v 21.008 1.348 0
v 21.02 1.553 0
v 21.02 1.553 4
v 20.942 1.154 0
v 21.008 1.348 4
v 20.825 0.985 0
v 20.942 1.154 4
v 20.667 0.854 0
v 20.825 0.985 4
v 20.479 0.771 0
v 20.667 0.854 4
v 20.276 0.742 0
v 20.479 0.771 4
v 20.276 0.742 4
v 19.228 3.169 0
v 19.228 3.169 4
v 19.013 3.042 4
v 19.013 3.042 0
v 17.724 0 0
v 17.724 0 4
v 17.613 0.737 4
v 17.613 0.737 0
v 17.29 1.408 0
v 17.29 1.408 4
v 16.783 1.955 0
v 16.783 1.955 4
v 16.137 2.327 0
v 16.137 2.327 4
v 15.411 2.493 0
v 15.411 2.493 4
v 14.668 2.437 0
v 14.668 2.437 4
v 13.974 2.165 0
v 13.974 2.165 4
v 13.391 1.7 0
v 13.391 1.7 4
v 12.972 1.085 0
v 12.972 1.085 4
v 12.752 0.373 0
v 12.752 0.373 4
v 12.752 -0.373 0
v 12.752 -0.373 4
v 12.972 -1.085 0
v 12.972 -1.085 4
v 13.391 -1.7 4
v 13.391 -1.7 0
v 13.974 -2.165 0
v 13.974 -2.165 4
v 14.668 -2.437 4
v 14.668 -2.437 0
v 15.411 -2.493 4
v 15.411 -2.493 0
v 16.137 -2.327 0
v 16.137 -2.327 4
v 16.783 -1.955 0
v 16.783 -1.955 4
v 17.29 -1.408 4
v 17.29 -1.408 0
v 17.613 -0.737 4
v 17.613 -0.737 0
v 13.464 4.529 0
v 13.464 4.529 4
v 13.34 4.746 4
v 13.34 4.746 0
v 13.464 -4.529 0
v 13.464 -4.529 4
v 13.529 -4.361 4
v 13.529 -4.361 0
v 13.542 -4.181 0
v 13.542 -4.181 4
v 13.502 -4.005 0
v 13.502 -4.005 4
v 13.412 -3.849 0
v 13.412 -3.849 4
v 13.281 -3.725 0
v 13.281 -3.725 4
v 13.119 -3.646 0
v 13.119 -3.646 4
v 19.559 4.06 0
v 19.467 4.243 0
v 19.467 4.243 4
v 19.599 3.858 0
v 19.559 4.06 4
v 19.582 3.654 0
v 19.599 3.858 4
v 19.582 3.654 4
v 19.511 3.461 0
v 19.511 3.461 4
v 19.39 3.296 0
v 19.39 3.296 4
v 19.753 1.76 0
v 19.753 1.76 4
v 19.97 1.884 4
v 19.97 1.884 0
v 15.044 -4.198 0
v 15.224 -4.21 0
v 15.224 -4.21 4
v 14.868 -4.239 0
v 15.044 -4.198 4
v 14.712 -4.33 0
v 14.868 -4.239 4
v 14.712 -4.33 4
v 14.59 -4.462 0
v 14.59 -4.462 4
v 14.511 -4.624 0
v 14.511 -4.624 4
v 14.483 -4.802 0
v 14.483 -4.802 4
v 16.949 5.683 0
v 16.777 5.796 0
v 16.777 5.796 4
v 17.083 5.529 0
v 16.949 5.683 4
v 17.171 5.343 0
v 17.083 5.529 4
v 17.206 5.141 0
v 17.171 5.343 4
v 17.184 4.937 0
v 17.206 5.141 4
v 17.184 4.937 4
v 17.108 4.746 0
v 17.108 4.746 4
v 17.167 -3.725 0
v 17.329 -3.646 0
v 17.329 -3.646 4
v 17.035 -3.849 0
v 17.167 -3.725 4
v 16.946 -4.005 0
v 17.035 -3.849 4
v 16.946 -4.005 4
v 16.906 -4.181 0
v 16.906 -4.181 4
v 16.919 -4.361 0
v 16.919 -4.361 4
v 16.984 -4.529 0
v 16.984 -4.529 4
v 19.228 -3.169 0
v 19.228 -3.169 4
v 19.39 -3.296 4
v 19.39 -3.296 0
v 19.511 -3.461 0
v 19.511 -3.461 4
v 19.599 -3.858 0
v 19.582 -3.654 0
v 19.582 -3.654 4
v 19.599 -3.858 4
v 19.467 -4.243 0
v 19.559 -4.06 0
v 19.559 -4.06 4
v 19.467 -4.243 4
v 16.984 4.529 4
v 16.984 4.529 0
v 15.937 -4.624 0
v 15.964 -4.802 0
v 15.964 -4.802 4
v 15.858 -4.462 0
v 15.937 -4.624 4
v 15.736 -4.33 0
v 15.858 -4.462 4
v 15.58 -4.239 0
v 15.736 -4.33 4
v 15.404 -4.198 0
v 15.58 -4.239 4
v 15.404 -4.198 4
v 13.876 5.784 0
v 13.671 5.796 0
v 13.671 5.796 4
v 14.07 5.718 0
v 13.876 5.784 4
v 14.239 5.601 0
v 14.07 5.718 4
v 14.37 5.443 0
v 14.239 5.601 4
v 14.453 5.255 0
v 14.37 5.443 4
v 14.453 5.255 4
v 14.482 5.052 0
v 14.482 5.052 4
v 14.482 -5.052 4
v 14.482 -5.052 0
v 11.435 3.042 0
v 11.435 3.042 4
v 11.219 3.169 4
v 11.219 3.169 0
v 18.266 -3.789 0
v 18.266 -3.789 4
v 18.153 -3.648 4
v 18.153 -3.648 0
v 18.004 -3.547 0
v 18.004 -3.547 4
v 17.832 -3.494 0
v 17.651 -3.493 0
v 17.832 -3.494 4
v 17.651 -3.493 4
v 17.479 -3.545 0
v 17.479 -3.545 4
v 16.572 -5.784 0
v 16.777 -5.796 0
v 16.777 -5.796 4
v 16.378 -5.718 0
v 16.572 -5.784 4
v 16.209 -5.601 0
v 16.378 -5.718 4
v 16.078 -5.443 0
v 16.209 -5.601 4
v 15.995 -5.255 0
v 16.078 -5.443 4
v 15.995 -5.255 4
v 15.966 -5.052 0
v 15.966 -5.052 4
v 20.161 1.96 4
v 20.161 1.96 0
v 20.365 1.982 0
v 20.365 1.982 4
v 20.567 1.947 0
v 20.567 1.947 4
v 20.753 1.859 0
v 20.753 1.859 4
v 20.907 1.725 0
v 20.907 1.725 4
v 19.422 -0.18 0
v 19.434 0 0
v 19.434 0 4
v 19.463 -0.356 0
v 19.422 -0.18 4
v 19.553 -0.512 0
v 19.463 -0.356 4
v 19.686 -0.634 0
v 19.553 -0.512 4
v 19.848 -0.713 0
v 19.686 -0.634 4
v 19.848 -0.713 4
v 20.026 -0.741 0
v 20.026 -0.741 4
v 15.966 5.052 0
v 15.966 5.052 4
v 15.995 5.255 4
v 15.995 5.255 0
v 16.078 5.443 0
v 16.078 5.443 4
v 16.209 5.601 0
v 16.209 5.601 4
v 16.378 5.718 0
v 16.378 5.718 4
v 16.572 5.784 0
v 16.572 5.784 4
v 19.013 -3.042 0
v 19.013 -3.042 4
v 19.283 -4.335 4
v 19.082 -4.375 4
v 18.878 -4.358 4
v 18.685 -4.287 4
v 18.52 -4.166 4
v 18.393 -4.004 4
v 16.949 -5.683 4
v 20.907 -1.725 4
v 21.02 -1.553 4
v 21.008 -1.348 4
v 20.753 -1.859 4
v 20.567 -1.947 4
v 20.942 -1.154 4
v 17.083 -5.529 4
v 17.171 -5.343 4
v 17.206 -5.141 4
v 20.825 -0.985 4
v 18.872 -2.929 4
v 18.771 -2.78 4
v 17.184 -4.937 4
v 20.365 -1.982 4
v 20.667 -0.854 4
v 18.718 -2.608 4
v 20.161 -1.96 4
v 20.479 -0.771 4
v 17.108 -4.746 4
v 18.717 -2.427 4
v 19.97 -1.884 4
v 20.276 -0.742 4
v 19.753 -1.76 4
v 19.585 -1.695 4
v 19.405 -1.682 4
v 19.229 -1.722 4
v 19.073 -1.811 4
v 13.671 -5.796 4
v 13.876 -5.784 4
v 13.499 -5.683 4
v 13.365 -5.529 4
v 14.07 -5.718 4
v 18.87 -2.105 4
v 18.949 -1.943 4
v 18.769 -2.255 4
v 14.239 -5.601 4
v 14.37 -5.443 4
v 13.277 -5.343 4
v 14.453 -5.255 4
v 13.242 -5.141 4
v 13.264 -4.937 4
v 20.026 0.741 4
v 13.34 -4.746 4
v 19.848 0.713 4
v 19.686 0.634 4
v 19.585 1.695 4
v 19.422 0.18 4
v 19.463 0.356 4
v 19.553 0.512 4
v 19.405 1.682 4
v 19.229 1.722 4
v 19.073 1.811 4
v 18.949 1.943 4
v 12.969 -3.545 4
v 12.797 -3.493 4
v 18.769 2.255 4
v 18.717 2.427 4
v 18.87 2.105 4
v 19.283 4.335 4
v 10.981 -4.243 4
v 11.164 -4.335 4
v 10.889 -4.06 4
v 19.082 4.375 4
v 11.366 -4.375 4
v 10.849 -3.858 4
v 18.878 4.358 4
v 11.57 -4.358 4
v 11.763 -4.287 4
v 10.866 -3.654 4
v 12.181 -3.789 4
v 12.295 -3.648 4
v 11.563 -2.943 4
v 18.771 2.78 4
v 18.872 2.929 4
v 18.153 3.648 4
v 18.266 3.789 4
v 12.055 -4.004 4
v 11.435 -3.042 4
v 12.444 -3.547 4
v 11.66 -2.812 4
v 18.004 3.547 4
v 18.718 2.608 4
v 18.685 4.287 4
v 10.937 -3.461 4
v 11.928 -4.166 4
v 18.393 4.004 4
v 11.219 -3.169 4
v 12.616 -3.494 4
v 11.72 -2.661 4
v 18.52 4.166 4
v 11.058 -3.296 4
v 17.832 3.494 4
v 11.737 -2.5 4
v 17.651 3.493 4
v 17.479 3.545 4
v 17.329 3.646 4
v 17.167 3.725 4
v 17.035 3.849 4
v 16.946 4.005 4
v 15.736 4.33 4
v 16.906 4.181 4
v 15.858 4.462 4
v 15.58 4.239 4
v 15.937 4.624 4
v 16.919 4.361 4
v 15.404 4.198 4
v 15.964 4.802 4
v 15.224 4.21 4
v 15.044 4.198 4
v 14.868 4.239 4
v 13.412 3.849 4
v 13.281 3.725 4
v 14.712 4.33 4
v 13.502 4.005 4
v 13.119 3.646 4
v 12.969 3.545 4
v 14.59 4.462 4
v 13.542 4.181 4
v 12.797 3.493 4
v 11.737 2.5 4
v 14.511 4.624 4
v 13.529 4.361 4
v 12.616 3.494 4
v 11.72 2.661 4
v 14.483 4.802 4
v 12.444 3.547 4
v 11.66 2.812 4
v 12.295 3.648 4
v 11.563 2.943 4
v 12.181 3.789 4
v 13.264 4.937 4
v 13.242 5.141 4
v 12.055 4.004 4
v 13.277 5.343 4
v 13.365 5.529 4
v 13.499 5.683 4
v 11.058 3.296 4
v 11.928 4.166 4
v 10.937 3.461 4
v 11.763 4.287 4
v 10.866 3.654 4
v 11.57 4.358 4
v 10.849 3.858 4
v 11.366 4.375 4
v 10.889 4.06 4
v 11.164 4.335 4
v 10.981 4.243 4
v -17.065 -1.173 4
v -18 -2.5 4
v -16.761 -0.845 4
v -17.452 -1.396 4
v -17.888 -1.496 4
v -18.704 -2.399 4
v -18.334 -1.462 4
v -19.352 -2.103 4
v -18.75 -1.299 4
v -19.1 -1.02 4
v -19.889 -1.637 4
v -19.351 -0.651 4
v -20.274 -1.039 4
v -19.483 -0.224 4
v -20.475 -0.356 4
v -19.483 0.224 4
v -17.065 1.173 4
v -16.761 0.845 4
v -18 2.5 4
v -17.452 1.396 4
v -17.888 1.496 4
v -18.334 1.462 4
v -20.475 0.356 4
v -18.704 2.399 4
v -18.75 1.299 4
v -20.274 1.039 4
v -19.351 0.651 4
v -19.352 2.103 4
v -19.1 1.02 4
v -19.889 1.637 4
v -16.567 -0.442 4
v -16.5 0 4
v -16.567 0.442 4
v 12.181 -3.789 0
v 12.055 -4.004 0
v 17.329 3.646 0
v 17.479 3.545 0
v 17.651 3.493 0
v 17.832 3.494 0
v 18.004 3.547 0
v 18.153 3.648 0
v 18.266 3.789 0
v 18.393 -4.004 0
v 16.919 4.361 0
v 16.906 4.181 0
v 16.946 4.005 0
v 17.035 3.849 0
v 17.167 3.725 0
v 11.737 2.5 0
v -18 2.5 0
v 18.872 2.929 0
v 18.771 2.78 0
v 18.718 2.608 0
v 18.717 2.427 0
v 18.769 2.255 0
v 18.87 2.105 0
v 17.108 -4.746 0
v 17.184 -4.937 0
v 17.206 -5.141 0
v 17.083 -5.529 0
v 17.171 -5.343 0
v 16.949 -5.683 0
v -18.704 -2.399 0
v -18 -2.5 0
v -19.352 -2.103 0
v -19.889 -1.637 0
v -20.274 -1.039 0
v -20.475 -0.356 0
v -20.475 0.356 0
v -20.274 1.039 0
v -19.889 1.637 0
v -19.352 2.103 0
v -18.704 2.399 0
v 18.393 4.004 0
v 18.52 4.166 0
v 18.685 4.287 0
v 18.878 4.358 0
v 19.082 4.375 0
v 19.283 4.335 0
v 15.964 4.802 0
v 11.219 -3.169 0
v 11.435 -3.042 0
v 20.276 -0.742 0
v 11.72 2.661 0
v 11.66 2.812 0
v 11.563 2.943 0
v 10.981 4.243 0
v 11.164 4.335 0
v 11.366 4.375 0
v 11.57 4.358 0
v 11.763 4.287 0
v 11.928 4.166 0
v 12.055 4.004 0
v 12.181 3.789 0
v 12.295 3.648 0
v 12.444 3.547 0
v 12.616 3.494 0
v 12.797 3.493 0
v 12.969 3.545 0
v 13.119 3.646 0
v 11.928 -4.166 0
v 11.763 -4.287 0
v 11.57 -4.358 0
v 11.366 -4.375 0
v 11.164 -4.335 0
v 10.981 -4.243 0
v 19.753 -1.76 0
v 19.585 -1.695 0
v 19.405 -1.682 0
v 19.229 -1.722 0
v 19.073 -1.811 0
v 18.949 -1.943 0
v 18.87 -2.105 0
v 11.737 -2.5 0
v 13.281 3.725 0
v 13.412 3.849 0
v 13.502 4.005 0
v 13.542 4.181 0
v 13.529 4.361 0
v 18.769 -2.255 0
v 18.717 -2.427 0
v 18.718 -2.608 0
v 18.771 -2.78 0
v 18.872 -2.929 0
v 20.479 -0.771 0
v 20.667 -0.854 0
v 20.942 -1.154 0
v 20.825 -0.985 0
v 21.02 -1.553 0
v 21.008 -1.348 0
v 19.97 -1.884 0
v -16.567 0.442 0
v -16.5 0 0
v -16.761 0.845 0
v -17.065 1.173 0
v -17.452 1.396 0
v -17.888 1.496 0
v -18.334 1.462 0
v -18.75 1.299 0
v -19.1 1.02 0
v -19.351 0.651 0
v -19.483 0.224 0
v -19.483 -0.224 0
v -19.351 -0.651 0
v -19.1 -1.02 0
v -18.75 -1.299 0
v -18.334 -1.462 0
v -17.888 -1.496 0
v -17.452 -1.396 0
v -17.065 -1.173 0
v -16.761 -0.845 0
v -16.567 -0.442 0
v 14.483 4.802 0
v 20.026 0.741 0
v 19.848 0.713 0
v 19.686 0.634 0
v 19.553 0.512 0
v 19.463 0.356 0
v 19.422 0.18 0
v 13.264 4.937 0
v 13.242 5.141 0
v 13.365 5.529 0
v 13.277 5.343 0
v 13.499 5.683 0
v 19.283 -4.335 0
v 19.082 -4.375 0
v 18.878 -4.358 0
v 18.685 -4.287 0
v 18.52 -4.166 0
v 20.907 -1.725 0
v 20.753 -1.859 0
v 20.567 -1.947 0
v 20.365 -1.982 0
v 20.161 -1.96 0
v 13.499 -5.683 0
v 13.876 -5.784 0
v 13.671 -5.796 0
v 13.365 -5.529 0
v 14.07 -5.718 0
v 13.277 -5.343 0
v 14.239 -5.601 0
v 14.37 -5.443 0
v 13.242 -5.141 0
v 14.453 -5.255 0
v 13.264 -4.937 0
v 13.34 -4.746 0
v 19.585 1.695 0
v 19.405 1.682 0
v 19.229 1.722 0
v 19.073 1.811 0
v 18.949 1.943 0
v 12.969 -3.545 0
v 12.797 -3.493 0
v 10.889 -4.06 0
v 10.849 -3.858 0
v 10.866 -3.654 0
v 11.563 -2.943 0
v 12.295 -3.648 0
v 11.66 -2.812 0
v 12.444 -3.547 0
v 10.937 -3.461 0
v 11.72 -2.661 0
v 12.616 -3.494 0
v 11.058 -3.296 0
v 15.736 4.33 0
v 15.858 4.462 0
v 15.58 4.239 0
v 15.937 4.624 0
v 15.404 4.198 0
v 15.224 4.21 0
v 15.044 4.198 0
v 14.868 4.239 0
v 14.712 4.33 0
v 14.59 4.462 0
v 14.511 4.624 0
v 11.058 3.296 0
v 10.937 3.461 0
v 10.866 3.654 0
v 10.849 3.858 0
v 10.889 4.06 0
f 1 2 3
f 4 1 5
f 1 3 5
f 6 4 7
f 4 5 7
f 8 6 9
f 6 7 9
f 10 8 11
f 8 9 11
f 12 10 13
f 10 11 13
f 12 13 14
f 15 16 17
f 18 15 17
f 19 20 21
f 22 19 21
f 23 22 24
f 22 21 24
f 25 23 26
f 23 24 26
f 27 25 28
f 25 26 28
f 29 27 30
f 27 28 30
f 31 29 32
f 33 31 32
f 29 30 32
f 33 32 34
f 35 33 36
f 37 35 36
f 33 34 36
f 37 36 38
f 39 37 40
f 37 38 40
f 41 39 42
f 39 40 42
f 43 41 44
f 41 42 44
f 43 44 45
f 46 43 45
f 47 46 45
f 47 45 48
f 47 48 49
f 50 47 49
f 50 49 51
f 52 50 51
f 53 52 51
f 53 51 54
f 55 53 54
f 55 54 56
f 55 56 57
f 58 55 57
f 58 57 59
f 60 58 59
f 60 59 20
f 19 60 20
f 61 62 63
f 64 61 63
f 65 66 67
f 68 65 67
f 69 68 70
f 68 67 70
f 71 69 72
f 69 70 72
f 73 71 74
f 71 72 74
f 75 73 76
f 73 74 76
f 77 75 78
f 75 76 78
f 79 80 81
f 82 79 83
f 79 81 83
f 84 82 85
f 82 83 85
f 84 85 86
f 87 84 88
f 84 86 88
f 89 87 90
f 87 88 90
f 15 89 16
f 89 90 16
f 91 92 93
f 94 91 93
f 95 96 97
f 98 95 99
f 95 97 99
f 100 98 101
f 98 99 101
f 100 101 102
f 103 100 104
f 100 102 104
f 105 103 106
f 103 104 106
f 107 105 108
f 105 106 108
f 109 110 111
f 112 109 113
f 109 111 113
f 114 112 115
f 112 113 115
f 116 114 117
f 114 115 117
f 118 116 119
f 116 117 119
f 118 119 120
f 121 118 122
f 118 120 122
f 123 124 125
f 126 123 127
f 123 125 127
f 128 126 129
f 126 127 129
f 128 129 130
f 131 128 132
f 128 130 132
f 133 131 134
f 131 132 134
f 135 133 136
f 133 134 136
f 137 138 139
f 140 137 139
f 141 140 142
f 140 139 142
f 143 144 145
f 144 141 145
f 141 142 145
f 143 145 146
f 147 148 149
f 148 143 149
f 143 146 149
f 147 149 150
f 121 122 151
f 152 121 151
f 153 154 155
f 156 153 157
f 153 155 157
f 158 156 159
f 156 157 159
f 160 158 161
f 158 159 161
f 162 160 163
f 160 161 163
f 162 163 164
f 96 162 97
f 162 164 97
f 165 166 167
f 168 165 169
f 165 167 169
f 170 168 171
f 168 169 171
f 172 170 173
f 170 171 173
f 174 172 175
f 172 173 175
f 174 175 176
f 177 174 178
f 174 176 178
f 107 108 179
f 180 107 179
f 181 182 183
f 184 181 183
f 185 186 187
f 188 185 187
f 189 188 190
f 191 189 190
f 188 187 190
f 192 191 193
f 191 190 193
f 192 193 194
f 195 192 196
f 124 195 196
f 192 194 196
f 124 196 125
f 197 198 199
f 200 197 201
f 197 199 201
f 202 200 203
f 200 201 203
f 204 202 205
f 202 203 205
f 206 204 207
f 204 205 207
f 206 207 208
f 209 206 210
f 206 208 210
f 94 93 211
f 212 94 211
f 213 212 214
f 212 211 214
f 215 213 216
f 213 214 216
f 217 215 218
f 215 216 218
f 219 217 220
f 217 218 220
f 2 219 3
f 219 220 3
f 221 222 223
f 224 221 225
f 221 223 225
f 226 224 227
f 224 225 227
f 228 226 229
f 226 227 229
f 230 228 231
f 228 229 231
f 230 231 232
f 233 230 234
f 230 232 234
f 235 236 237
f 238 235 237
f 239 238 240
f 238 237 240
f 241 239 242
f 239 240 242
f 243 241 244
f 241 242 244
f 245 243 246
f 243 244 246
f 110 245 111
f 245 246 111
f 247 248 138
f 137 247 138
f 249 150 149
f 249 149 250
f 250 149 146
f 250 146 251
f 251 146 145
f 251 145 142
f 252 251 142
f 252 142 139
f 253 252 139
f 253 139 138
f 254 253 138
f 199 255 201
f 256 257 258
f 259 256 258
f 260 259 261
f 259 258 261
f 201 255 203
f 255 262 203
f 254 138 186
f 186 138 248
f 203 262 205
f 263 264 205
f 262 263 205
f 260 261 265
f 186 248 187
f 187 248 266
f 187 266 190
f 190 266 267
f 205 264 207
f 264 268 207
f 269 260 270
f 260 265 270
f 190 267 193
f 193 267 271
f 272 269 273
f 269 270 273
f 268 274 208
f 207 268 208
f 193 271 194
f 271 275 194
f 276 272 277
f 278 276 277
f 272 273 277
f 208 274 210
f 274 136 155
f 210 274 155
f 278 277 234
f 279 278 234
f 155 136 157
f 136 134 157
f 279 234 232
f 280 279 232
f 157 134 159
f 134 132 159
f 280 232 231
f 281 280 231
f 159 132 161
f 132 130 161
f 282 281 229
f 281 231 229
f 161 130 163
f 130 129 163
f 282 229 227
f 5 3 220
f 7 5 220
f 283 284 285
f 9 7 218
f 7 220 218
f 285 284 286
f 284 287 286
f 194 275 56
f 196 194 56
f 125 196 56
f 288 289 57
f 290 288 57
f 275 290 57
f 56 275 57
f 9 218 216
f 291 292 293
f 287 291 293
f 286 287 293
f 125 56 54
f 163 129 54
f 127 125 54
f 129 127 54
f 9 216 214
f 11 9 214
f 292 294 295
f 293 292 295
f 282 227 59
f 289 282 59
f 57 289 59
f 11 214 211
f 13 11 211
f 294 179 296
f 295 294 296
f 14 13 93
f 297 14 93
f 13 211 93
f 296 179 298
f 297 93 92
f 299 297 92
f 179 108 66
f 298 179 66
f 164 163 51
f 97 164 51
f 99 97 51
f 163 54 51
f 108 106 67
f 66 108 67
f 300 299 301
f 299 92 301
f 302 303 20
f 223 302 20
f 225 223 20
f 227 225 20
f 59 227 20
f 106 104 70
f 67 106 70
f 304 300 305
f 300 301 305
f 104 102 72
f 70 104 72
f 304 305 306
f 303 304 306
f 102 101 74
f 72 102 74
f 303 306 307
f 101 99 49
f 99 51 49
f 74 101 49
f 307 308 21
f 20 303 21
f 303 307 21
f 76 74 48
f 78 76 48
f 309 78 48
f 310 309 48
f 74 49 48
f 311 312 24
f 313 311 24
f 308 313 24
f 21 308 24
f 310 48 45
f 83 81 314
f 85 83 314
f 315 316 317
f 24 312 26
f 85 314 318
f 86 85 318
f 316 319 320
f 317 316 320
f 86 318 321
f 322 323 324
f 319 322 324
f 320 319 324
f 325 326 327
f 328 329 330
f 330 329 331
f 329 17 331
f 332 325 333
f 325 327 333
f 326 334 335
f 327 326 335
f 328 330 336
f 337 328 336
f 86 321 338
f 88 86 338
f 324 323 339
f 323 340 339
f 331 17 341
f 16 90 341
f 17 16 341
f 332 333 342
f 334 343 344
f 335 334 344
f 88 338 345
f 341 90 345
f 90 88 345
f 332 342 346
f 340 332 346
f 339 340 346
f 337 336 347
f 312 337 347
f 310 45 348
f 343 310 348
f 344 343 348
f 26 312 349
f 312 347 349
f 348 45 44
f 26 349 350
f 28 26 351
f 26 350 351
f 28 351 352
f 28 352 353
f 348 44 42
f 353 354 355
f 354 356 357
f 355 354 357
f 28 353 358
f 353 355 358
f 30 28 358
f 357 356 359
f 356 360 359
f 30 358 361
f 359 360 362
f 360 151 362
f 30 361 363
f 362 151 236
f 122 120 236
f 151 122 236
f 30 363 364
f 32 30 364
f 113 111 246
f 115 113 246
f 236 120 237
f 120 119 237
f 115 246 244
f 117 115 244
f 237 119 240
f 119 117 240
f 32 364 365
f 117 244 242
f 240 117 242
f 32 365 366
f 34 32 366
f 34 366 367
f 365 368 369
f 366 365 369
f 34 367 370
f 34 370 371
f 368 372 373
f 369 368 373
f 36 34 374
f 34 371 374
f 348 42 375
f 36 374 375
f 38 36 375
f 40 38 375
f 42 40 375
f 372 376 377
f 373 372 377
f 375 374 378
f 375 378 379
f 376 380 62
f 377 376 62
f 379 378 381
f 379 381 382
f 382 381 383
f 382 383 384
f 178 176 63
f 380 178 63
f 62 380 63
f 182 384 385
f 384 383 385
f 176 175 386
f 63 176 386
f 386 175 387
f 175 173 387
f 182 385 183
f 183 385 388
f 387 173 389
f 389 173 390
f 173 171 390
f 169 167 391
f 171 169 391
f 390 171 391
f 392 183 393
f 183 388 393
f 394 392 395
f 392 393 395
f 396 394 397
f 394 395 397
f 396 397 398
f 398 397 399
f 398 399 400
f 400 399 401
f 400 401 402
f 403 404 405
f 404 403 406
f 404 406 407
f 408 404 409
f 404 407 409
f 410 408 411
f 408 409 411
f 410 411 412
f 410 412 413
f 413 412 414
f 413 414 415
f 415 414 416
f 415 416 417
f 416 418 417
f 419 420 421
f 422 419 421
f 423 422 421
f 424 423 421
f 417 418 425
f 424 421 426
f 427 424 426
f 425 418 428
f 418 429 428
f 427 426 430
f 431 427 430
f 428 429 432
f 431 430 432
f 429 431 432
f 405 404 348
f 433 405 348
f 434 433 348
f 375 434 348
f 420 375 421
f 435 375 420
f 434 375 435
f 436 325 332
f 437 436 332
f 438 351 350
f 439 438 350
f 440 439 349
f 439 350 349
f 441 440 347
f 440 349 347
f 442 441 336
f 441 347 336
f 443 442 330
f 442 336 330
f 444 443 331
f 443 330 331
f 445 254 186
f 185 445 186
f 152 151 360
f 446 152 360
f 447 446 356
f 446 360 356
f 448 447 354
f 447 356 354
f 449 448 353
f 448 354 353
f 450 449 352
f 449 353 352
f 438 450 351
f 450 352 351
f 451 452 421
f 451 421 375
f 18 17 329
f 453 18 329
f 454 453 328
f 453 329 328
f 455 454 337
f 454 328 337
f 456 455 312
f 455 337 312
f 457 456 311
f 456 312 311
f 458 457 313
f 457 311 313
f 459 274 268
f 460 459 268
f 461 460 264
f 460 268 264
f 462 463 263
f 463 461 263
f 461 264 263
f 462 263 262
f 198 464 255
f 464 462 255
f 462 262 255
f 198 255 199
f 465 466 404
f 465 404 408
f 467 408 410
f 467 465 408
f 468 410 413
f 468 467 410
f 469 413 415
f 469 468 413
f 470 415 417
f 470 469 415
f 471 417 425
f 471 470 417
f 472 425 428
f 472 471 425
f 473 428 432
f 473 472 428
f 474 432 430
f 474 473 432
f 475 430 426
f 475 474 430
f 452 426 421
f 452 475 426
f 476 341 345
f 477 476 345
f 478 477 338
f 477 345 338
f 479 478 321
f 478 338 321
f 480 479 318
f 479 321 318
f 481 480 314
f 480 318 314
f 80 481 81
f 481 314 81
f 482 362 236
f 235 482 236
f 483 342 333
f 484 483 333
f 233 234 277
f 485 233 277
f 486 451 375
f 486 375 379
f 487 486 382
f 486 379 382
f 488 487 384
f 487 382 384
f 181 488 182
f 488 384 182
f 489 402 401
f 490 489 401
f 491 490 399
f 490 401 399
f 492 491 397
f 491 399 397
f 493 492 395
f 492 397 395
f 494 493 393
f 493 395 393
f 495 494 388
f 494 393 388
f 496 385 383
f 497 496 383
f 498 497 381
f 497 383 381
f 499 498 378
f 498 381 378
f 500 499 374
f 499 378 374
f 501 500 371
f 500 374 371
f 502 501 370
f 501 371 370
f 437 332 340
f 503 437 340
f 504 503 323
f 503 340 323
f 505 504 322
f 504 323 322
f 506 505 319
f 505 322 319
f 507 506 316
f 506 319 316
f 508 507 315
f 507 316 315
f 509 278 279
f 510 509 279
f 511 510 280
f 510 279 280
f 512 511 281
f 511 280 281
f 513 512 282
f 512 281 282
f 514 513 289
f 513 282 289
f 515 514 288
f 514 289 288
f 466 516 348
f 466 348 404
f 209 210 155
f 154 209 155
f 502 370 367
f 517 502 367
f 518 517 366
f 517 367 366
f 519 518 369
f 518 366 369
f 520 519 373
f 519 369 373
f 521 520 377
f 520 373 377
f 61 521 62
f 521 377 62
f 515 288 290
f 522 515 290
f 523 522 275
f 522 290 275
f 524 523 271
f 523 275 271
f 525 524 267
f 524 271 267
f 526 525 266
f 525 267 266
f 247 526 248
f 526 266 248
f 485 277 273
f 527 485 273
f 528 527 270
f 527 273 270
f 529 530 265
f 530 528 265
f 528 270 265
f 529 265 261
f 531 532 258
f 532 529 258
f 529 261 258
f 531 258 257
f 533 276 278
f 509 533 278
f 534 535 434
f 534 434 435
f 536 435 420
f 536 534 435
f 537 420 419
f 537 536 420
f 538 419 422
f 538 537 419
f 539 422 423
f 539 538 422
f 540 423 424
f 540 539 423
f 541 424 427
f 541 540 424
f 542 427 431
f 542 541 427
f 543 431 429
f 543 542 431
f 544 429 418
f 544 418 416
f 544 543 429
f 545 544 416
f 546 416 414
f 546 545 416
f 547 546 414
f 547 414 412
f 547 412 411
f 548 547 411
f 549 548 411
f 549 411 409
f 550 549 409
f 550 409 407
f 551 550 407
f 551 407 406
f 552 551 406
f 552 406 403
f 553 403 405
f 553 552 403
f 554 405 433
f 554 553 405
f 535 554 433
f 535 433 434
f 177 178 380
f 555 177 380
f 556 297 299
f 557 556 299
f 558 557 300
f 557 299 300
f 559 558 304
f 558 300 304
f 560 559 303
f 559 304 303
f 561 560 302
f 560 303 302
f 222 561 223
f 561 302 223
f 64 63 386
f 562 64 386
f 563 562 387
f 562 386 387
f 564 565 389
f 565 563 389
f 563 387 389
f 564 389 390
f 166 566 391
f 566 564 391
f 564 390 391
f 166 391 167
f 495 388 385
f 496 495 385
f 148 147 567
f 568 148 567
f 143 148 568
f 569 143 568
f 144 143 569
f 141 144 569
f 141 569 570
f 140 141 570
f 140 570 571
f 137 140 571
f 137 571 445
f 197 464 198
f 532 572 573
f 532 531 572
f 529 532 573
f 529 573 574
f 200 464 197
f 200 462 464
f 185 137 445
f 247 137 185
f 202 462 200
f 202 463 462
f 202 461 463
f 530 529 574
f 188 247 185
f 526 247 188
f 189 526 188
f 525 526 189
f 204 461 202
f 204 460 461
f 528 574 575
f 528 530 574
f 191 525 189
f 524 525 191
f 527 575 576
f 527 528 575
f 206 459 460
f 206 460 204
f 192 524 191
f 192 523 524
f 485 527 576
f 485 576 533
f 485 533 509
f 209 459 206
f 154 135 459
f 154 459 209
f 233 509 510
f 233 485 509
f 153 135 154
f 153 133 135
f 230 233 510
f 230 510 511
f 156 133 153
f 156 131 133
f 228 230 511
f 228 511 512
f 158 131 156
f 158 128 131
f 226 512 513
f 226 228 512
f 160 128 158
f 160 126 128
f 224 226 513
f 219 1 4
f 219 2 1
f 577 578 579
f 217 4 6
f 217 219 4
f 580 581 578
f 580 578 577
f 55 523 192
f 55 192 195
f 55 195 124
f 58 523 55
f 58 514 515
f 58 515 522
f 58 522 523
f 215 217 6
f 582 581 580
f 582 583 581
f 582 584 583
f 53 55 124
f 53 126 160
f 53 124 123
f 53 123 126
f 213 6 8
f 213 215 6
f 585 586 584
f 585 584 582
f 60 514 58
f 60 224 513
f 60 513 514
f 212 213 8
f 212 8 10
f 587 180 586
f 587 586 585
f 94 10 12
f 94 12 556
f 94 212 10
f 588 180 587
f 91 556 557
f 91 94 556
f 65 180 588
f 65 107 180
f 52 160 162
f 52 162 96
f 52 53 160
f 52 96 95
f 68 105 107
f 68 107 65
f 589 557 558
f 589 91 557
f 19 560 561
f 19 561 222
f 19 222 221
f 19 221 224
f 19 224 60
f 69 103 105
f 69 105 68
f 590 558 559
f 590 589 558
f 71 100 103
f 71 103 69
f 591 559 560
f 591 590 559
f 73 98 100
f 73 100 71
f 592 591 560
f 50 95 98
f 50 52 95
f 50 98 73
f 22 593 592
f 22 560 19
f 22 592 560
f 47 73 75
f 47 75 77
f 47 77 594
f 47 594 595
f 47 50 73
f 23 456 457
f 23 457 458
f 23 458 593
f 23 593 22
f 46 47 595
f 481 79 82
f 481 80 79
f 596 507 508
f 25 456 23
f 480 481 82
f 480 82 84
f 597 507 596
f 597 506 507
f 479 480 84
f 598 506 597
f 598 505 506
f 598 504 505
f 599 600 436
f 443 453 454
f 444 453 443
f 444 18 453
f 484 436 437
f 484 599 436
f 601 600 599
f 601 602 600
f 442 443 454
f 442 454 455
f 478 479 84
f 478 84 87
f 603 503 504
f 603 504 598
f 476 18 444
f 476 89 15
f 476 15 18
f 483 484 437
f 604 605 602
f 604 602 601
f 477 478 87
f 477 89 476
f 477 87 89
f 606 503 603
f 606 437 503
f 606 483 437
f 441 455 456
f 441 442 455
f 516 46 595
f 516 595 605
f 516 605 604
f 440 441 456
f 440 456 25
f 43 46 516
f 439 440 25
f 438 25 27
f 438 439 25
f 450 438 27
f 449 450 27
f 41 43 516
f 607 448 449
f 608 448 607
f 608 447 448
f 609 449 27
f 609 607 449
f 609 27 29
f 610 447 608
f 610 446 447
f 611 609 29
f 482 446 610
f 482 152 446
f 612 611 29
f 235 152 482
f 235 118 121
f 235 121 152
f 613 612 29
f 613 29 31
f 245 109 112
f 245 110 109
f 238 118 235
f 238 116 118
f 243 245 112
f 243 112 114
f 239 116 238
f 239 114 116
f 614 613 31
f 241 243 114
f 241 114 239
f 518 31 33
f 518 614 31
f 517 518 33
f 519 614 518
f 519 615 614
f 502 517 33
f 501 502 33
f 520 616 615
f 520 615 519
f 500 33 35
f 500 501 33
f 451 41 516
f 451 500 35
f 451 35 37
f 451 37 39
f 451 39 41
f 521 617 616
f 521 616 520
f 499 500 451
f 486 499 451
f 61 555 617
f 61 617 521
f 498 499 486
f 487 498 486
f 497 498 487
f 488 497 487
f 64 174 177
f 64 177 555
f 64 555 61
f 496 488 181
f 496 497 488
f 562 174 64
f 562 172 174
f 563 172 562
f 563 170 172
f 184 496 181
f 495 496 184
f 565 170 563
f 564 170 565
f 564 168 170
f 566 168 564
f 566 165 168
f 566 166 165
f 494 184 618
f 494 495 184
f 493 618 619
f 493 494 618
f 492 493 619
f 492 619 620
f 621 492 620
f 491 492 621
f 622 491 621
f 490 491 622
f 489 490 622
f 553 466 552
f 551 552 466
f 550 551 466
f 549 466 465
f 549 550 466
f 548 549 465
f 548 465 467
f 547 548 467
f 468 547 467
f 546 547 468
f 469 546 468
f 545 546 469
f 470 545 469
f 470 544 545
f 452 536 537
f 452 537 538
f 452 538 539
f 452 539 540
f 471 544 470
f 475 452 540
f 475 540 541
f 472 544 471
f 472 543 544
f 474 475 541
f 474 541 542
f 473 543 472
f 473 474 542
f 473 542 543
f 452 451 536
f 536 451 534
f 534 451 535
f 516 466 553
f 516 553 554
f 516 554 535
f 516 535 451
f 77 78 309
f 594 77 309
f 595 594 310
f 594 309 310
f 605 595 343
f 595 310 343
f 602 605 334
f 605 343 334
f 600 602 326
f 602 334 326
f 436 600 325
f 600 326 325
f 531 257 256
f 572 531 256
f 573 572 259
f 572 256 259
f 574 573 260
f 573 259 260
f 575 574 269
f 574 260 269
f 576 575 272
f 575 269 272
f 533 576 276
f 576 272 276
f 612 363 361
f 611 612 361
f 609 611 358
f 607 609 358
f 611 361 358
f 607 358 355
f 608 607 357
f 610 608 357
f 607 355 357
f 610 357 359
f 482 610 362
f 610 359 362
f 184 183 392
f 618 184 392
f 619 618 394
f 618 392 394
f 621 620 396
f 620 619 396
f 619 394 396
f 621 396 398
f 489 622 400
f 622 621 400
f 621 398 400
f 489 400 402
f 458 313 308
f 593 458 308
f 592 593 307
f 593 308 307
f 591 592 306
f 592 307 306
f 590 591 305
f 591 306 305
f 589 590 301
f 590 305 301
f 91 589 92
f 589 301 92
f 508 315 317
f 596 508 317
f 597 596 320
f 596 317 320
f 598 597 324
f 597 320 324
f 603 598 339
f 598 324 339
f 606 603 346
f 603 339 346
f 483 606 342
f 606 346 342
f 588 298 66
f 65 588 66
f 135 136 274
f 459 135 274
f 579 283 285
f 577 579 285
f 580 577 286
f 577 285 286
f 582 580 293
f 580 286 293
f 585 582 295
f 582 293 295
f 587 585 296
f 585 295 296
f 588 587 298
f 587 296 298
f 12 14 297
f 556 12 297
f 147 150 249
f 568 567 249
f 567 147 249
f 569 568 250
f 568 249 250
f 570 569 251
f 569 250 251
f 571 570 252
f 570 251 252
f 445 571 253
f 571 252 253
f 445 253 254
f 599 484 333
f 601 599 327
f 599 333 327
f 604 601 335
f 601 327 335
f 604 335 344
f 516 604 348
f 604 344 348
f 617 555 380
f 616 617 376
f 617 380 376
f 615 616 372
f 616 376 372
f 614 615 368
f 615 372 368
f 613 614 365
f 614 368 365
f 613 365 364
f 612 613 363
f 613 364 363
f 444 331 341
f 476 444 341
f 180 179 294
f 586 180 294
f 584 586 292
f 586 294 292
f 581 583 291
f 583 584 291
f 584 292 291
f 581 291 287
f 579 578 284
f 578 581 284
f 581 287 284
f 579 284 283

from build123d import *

# Parameters (mm, degrees)
SKETCH1_R           = 1.5
BOSS_EXTRUDE1_DEPTH = 4
CUT_EXTRUDE1_DEPTH  = 23.415528994
CIRPATTERN1_COUNT   = 12
SKETCH3_W           = 11.336678395
SKETCH3_H           = 5
BOSS_EXTRUDE2_DEPTH = 4
SKETCH4_R           = 2.5
CUT_EXTRUDE2_DEPTH  = 23.170725743


with BuildPart() as part:
    # Sketch1 → Boss-Extrude1 (new body)
    with BuildSketch(Plane.XY):
        with BuildLine():
            Line((-18, 2.5), (9.769591268, 2.5))
            ThreePointArc((9.769591268, 2.5), (21.223947325, 0), (9.769591268, -2.5))
            Line((9.769591268, -2.5), (-18, -2.5))
            ThreePointArc((-18, -2.5), (-20.5, 0), (-18, 2.5))
        make_face()
        with Locations((-18, 0)):
            Circle(SKETCH1_R, mode=Mode.SUBTRACT)
    extrude(amount=BOSS_EXTRUDE1_DEPTH)

    # Sketch2 → Cut-Extrude1 (cut, through all)
    with BuildSketch(Plane.XY.offset(4)):
        with BuildLine():
            Line((17.107572926, 4.746445804), (16.983821507, 4.529223369))
            ThreePointArc((16.983821507, 4.529223369), (16.945677893, 4.005263167), (17.328947325, 3.64596695))
            ThreePointArc((17.328947325, 3.64596695), (17.831741692, 3.493693994), (18.266432731, 3.788707433))
            Line((18.266432731, 3.788707433), (18.392677169, 4.004490523))
            ThreePointArc((18.392677169, 4.004490523), (18.877651327, 4.357969149), (19.466588012, 4.242640687))
            ThreePointArc((19.466588012, 4.242640687), (18.501167967, 5.676312659), (16.776861596, 5.795554958))
            ThreePointArc((16.776861596, 5.795554958), (17.171207316, 5.343185058), (17.107572926, 4.746445804))
        make_face()
    cut_extrude1 = extrude(amount=-CUT_EXTRUDE1_DEPTH, mode=Mode.SUBTRACT)

    # CirPattern1: Cut-Extrude1 ×12 about axis
    cirpattern1_axis = Axis((15.223947325, 0, 0), (0, 0, 1))
    for i in range(1, CIRPATTERN1_COUNT):
        add(cut_extrude1.rotate(cirpattern1_axis, i * 360 / CIRPATTERN1_COUNT), mode=Mode.SUBTRACT)

    # Sketch3 → Boss-Extrude2 (add)
    with BuildSketch(Plane.XY.offset(4)):
        with Locations((11.656973093, 0)):
            Rectangle(SKETCH3_W, SKETCH3_H)
    extrude(amount=-BOSS_EXTRUDE2_DEPTH)

    # Sketch4 → Cut-Extrude2 (cut, through all)
    with BuildSketch(Plane.XY.offset(4)):
        with Locations((15.223947325, 0)):
            Circle(SKETCH4_R)
    extrude(amount=-CUT_EXTRUDE2_DEPTH, mode=Mode.SUBTRACT)


solid = part.part
